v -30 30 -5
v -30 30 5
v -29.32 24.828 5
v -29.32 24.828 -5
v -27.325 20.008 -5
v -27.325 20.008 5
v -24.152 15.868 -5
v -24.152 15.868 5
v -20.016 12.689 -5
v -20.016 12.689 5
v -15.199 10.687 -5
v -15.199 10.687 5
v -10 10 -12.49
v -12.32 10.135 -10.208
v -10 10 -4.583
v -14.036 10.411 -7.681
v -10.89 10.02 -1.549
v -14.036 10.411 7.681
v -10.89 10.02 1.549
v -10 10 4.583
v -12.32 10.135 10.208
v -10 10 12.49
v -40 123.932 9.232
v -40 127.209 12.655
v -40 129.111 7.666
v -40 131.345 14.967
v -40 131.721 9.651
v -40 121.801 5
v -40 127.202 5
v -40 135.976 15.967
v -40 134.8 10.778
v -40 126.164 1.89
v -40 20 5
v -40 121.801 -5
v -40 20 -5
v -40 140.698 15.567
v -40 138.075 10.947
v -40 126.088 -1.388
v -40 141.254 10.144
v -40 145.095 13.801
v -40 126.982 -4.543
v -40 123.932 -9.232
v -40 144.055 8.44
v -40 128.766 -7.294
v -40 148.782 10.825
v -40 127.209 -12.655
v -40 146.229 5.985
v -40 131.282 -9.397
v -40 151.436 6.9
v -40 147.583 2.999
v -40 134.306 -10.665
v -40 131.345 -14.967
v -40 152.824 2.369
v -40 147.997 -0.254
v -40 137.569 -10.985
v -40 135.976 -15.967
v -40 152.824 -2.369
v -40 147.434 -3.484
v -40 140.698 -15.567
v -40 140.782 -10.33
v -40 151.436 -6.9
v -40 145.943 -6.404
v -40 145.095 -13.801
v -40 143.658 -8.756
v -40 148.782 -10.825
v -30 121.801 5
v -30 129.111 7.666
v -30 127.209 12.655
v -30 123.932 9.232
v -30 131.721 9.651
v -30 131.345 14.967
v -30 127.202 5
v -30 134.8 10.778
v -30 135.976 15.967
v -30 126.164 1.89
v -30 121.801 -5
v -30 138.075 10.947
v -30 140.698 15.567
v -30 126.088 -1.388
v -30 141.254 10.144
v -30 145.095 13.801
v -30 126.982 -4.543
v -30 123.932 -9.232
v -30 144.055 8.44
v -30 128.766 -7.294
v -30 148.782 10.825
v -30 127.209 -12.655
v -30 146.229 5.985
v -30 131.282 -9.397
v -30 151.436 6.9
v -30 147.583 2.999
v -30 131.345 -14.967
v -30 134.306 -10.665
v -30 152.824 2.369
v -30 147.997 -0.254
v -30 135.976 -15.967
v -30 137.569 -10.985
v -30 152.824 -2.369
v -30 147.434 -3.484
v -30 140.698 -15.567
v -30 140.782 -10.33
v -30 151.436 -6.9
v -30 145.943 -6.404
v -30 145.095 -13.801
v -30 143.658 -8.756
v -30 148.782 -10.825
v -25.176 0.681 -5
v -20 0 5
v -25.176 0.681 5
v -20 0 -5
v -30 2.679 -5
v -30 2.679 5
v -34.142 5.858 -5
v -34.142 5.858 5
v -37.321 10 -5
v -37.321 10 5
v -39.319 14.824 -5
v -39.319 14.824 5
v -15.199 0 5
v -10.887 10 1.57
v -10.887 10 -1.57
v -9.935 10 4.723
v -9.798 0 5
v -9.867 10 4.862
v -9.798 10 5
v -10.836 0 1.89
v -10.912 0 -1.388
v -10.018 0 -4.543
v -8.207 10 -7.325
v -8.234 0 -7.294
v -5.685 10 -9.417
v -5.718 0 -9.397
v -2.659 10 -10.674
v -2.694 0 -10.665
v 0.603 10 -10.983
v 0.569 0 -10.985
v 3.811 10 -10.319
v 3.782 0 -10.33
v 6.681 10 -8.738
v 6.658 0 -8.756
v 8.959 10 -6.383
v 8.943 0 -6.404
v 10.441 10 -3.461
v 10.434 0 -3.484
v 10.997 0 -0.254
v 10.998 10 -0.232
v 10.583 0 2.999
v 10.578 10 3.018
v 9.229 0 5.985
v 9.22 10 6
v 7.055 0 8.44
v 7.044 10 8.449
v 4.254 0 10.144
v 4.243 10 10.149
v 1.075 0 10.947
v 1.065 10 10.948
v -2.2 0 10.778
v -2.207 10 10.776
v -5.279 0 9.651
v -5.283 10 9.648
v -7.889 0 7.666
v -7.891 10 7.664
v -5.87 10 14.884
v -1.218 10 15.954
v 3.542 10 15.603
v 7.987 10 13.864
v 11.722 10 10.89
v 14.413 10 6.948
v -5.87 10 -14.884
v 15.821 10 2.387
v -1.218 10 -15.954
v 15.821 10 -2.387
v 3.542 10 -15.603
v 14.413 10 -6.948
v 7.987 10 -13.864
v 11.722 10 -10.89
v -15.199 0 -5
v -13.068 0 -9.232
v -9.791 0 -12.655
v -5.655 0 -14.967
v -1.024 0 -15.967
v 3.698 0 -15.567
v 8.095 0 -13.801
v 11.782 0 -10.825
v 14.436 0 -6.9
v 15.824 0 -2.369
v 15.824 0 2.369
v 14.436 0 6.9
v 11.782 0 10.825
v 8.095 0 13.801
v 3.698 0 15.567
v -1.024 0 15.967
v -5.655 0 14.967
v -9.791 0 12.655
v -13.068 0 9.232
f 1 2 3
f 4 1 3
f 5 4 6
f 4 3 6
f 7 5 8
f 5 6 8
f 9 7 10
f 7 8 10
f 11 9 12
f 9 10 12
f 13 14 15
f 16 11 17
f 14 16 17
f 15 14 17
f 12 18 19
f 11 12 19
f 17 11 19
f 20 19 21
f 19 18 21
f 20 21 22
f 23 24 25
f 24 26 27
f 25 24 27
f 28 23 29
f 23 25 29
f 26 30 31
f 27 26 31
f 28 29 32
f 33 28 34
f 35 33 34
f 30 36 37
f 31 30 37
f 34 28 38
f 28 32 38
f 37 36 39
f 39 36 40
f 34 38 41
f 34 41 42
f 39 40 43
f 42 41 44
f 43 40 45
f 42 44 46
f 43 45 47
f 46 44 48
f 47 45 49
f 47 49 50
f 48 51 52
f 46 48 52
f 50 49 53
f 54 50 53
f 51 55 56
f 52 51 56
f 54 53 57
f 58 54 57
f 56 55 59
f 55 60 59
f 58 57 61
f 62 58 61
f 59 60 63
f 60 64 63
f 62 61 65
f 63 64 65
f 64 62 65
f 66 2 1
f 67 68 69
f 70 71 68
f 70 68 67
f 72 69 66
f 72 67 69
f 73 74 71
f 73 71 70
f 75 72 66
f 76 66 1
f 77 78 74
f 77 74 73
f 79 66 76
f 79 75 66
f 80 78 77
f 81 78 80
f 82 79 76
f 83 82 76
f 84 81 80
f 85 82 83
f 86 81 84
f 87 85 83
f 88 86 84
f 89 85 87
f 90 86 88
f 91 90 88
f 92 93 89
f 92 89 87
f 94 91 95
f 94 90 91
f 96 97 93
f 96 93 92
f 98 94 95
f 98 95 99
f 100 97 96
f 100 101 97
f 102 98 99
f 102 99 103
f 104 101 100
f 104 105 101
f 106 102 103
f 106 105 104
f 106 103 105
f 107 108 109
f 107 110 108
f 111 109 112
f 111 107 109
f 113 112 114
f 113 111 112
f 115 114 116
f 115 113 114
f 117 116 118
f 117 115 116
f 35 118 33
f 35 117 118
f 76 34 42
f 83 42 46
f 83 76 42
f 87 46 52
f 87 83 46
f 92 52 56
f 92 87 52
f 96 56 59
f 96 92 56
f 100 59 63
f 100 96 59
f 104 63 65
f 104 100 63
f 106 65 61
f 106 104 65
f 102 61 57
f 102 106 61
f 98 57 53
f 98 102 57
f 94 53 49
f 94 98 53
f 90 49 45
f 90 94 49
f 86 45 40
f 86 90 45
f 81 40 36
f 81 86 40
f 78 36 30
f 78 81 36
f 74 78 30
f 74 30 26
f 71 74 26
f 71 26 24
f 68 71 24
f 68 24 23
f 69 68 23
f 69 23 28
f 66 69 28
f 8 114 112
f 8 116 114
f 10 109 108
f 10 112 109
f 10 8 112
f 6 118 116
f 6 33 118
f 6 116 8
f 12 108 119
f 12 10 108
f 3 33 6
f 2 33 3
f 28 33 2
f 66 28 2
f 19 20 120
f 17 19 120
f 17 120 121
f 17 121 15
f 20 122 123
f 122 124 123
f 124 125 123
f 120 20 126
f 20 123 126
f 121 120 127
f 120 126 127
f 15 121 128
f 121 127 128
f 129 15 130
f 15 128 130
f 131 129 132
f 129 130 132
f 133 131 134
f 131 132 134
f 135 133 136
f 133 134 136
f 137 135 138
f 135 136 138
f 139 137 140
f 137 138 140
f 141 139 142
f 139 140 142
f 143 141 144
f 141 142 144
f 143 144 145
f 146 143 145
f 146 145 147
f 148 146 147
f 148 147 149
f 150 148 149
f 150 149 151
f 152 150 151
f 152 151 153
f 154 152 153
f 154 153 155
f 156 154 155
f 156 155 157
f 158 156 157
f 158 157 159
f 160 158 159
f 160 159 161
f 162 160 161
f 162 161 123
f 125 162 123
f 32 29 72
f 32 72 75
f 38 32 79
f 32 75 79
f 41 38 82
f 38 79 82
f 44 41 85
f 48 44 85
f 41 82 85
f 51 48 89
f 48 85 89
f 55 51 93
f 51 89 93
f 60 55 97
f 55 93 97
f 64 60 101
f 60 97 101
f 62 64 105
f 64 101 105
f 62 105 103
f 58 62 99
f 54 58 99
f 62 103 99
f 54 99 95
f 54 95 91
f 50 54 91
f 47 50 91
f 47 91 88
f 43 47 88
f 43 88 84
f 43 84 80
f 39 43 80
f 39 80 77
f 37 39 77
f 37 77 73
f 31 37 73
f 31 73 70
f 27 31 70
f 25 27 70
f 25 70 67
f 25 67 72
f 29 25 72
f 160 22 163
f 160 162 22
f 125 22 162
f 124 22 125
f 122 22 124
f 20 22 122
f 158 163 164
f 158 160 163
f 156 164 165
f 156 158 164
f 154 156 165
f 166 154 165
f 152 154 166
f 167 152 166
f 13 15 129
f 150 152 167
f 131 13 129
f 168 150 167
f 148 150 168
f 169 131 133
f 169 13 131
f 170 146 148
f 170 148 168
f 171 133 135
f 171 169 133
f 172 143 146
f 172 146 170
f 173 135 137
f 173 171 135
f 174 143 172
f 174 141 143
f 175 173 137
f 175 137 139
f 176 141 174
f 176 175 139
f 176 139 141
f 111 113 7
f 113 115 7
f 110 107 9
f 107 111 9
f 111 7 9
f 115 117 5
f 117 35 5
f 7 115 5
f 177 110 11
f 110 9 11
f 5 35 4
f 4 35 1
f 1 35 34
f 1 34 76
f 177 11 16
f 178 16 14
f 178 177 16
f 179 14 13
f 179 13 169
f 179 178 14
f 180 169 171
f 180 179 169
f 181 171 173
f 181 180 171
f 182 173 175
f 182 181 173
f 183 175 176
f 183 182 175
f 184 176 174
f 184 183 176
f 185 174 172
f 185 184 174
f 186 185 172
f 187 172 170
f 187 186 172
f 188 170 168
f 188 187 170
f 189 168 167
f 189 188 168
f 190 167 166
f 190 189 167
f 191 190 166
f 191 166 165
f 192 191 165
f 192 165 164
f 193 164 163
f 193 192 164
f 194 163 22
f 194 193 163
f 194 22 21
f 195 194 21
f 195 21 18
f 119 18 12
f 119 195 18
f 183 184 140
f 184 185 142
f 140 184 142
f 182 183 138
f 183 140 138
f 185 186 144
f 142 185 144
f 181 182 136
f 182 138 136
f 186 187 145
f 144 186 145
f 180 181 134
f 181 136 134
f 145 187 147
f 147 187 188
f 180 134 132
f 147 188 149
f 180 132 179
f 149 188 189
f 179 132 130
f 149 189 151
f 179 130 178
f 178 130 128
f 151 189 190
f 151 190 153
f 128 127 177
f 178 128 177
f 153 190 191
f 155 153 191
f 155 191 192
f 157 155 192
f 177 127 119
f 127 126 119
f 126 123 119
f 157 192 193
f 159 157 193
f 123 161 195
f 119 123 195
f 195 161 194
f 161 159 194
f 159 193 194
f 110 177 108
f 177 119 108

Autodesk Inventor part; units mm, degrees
ref_plane "YZ Plane" through (0, 0, 0) normal (1, 0, 0) x (0, 1, 0)
ref_plane "XZ Plane" through (0, 0, 0) normal (0, 1, 0) x (-1, 0, 0)
ref_plane "XY Plane" through (0, 0, 0) normal (0, 0, 1) x (1, 0, 0)
sketch "Szkic2" plane through (0, 0, 0) normal (0, 1, 0) x (-1, 0, 0)
  circle A0 centre (0, 0) radius 11
  circle A1 centre (0, 0) radius 16
  dimension "d0" = 22
  dimension "d1" = 5
extrude "Wyciągnięcie proste1" add sketch "Szkic2" along normal blind 10
sketch "Szkic4" plane through (0, 0, 0) normal (0, 0, 1) x (1, 0, 0)
  line L0 (0, 0) -> (-30, 0)
  line L1 (-30, 0) -> (-30, 10)
  line L2 (-30, 10) -> (0, 10)
  line L3 (0, 10) -> (0, 0)
  line L4 (-30, 0) -> (-40, 0)
  line L5 (-40, 0) -> (-40, 137)
  line L6 (-40, 137) -> (-30, 137)
  line L7 (-30, 137) -> (-30, 0)
  point P0 (-30, 10)
  dimension "d7" = 137
  dimension "d8" = 30
  dimension "d9" = 10
  dimension "d10" = 10
extrude "Wyciągnięcie proste2" add sketch "Szkic4" along normal mid plane 10
fillet "Zaokrąglenie1" radius 20 2 edges at (-40, 0, 0) (-30, 10, 0)
sketch "Szkic7" plane through (-30, 137, 5) normal (1, 0, 0) x (0, 0, -1)
  line L0 (10, 0) -> (0, 0) projected
  circle A0 centre (5, 0) radius 11
  circle A1 centre (5, 0) radius 16
  point P0 (5, -137)
  dimension "d14" = 22
  dimension "d15" = 32
extrude "Wyciągnięcie proste3" add sketch "Szkic7" against normal blind 10
sketch "Szkic8" plane through (0, 10, 0) normal (0, 1, 0) x (1, 0, 0)
  circle A0 centre (0, 0) radius 11
extrude "Wyciągnięcie proste4" cut sketch "Szkic8" against normal blind 10
sketch "Szkic9" plane through (-30, 30, 5) normal (1, 0, 0) x (0, 0, -1)
  line L0 (10, 107) -> (0, 107) projected
  circle A0 centre (5, 107) radius 11
  point P0 (5, -30)
extrude "Wyciągnięcie proste5" cut sketch "Szkic9" against normal blind 10
sketch "Szkic10" plane through (0, 10, 0) normal (0, -1, 0) x (1, 0, 0)
  circle A0 centre (0, 0) radius 11
extrude "Wyciągnięcie proste6" cut sketch "Szkic10" against normal blind 10
properties part number "Gora-dol-ramie"
